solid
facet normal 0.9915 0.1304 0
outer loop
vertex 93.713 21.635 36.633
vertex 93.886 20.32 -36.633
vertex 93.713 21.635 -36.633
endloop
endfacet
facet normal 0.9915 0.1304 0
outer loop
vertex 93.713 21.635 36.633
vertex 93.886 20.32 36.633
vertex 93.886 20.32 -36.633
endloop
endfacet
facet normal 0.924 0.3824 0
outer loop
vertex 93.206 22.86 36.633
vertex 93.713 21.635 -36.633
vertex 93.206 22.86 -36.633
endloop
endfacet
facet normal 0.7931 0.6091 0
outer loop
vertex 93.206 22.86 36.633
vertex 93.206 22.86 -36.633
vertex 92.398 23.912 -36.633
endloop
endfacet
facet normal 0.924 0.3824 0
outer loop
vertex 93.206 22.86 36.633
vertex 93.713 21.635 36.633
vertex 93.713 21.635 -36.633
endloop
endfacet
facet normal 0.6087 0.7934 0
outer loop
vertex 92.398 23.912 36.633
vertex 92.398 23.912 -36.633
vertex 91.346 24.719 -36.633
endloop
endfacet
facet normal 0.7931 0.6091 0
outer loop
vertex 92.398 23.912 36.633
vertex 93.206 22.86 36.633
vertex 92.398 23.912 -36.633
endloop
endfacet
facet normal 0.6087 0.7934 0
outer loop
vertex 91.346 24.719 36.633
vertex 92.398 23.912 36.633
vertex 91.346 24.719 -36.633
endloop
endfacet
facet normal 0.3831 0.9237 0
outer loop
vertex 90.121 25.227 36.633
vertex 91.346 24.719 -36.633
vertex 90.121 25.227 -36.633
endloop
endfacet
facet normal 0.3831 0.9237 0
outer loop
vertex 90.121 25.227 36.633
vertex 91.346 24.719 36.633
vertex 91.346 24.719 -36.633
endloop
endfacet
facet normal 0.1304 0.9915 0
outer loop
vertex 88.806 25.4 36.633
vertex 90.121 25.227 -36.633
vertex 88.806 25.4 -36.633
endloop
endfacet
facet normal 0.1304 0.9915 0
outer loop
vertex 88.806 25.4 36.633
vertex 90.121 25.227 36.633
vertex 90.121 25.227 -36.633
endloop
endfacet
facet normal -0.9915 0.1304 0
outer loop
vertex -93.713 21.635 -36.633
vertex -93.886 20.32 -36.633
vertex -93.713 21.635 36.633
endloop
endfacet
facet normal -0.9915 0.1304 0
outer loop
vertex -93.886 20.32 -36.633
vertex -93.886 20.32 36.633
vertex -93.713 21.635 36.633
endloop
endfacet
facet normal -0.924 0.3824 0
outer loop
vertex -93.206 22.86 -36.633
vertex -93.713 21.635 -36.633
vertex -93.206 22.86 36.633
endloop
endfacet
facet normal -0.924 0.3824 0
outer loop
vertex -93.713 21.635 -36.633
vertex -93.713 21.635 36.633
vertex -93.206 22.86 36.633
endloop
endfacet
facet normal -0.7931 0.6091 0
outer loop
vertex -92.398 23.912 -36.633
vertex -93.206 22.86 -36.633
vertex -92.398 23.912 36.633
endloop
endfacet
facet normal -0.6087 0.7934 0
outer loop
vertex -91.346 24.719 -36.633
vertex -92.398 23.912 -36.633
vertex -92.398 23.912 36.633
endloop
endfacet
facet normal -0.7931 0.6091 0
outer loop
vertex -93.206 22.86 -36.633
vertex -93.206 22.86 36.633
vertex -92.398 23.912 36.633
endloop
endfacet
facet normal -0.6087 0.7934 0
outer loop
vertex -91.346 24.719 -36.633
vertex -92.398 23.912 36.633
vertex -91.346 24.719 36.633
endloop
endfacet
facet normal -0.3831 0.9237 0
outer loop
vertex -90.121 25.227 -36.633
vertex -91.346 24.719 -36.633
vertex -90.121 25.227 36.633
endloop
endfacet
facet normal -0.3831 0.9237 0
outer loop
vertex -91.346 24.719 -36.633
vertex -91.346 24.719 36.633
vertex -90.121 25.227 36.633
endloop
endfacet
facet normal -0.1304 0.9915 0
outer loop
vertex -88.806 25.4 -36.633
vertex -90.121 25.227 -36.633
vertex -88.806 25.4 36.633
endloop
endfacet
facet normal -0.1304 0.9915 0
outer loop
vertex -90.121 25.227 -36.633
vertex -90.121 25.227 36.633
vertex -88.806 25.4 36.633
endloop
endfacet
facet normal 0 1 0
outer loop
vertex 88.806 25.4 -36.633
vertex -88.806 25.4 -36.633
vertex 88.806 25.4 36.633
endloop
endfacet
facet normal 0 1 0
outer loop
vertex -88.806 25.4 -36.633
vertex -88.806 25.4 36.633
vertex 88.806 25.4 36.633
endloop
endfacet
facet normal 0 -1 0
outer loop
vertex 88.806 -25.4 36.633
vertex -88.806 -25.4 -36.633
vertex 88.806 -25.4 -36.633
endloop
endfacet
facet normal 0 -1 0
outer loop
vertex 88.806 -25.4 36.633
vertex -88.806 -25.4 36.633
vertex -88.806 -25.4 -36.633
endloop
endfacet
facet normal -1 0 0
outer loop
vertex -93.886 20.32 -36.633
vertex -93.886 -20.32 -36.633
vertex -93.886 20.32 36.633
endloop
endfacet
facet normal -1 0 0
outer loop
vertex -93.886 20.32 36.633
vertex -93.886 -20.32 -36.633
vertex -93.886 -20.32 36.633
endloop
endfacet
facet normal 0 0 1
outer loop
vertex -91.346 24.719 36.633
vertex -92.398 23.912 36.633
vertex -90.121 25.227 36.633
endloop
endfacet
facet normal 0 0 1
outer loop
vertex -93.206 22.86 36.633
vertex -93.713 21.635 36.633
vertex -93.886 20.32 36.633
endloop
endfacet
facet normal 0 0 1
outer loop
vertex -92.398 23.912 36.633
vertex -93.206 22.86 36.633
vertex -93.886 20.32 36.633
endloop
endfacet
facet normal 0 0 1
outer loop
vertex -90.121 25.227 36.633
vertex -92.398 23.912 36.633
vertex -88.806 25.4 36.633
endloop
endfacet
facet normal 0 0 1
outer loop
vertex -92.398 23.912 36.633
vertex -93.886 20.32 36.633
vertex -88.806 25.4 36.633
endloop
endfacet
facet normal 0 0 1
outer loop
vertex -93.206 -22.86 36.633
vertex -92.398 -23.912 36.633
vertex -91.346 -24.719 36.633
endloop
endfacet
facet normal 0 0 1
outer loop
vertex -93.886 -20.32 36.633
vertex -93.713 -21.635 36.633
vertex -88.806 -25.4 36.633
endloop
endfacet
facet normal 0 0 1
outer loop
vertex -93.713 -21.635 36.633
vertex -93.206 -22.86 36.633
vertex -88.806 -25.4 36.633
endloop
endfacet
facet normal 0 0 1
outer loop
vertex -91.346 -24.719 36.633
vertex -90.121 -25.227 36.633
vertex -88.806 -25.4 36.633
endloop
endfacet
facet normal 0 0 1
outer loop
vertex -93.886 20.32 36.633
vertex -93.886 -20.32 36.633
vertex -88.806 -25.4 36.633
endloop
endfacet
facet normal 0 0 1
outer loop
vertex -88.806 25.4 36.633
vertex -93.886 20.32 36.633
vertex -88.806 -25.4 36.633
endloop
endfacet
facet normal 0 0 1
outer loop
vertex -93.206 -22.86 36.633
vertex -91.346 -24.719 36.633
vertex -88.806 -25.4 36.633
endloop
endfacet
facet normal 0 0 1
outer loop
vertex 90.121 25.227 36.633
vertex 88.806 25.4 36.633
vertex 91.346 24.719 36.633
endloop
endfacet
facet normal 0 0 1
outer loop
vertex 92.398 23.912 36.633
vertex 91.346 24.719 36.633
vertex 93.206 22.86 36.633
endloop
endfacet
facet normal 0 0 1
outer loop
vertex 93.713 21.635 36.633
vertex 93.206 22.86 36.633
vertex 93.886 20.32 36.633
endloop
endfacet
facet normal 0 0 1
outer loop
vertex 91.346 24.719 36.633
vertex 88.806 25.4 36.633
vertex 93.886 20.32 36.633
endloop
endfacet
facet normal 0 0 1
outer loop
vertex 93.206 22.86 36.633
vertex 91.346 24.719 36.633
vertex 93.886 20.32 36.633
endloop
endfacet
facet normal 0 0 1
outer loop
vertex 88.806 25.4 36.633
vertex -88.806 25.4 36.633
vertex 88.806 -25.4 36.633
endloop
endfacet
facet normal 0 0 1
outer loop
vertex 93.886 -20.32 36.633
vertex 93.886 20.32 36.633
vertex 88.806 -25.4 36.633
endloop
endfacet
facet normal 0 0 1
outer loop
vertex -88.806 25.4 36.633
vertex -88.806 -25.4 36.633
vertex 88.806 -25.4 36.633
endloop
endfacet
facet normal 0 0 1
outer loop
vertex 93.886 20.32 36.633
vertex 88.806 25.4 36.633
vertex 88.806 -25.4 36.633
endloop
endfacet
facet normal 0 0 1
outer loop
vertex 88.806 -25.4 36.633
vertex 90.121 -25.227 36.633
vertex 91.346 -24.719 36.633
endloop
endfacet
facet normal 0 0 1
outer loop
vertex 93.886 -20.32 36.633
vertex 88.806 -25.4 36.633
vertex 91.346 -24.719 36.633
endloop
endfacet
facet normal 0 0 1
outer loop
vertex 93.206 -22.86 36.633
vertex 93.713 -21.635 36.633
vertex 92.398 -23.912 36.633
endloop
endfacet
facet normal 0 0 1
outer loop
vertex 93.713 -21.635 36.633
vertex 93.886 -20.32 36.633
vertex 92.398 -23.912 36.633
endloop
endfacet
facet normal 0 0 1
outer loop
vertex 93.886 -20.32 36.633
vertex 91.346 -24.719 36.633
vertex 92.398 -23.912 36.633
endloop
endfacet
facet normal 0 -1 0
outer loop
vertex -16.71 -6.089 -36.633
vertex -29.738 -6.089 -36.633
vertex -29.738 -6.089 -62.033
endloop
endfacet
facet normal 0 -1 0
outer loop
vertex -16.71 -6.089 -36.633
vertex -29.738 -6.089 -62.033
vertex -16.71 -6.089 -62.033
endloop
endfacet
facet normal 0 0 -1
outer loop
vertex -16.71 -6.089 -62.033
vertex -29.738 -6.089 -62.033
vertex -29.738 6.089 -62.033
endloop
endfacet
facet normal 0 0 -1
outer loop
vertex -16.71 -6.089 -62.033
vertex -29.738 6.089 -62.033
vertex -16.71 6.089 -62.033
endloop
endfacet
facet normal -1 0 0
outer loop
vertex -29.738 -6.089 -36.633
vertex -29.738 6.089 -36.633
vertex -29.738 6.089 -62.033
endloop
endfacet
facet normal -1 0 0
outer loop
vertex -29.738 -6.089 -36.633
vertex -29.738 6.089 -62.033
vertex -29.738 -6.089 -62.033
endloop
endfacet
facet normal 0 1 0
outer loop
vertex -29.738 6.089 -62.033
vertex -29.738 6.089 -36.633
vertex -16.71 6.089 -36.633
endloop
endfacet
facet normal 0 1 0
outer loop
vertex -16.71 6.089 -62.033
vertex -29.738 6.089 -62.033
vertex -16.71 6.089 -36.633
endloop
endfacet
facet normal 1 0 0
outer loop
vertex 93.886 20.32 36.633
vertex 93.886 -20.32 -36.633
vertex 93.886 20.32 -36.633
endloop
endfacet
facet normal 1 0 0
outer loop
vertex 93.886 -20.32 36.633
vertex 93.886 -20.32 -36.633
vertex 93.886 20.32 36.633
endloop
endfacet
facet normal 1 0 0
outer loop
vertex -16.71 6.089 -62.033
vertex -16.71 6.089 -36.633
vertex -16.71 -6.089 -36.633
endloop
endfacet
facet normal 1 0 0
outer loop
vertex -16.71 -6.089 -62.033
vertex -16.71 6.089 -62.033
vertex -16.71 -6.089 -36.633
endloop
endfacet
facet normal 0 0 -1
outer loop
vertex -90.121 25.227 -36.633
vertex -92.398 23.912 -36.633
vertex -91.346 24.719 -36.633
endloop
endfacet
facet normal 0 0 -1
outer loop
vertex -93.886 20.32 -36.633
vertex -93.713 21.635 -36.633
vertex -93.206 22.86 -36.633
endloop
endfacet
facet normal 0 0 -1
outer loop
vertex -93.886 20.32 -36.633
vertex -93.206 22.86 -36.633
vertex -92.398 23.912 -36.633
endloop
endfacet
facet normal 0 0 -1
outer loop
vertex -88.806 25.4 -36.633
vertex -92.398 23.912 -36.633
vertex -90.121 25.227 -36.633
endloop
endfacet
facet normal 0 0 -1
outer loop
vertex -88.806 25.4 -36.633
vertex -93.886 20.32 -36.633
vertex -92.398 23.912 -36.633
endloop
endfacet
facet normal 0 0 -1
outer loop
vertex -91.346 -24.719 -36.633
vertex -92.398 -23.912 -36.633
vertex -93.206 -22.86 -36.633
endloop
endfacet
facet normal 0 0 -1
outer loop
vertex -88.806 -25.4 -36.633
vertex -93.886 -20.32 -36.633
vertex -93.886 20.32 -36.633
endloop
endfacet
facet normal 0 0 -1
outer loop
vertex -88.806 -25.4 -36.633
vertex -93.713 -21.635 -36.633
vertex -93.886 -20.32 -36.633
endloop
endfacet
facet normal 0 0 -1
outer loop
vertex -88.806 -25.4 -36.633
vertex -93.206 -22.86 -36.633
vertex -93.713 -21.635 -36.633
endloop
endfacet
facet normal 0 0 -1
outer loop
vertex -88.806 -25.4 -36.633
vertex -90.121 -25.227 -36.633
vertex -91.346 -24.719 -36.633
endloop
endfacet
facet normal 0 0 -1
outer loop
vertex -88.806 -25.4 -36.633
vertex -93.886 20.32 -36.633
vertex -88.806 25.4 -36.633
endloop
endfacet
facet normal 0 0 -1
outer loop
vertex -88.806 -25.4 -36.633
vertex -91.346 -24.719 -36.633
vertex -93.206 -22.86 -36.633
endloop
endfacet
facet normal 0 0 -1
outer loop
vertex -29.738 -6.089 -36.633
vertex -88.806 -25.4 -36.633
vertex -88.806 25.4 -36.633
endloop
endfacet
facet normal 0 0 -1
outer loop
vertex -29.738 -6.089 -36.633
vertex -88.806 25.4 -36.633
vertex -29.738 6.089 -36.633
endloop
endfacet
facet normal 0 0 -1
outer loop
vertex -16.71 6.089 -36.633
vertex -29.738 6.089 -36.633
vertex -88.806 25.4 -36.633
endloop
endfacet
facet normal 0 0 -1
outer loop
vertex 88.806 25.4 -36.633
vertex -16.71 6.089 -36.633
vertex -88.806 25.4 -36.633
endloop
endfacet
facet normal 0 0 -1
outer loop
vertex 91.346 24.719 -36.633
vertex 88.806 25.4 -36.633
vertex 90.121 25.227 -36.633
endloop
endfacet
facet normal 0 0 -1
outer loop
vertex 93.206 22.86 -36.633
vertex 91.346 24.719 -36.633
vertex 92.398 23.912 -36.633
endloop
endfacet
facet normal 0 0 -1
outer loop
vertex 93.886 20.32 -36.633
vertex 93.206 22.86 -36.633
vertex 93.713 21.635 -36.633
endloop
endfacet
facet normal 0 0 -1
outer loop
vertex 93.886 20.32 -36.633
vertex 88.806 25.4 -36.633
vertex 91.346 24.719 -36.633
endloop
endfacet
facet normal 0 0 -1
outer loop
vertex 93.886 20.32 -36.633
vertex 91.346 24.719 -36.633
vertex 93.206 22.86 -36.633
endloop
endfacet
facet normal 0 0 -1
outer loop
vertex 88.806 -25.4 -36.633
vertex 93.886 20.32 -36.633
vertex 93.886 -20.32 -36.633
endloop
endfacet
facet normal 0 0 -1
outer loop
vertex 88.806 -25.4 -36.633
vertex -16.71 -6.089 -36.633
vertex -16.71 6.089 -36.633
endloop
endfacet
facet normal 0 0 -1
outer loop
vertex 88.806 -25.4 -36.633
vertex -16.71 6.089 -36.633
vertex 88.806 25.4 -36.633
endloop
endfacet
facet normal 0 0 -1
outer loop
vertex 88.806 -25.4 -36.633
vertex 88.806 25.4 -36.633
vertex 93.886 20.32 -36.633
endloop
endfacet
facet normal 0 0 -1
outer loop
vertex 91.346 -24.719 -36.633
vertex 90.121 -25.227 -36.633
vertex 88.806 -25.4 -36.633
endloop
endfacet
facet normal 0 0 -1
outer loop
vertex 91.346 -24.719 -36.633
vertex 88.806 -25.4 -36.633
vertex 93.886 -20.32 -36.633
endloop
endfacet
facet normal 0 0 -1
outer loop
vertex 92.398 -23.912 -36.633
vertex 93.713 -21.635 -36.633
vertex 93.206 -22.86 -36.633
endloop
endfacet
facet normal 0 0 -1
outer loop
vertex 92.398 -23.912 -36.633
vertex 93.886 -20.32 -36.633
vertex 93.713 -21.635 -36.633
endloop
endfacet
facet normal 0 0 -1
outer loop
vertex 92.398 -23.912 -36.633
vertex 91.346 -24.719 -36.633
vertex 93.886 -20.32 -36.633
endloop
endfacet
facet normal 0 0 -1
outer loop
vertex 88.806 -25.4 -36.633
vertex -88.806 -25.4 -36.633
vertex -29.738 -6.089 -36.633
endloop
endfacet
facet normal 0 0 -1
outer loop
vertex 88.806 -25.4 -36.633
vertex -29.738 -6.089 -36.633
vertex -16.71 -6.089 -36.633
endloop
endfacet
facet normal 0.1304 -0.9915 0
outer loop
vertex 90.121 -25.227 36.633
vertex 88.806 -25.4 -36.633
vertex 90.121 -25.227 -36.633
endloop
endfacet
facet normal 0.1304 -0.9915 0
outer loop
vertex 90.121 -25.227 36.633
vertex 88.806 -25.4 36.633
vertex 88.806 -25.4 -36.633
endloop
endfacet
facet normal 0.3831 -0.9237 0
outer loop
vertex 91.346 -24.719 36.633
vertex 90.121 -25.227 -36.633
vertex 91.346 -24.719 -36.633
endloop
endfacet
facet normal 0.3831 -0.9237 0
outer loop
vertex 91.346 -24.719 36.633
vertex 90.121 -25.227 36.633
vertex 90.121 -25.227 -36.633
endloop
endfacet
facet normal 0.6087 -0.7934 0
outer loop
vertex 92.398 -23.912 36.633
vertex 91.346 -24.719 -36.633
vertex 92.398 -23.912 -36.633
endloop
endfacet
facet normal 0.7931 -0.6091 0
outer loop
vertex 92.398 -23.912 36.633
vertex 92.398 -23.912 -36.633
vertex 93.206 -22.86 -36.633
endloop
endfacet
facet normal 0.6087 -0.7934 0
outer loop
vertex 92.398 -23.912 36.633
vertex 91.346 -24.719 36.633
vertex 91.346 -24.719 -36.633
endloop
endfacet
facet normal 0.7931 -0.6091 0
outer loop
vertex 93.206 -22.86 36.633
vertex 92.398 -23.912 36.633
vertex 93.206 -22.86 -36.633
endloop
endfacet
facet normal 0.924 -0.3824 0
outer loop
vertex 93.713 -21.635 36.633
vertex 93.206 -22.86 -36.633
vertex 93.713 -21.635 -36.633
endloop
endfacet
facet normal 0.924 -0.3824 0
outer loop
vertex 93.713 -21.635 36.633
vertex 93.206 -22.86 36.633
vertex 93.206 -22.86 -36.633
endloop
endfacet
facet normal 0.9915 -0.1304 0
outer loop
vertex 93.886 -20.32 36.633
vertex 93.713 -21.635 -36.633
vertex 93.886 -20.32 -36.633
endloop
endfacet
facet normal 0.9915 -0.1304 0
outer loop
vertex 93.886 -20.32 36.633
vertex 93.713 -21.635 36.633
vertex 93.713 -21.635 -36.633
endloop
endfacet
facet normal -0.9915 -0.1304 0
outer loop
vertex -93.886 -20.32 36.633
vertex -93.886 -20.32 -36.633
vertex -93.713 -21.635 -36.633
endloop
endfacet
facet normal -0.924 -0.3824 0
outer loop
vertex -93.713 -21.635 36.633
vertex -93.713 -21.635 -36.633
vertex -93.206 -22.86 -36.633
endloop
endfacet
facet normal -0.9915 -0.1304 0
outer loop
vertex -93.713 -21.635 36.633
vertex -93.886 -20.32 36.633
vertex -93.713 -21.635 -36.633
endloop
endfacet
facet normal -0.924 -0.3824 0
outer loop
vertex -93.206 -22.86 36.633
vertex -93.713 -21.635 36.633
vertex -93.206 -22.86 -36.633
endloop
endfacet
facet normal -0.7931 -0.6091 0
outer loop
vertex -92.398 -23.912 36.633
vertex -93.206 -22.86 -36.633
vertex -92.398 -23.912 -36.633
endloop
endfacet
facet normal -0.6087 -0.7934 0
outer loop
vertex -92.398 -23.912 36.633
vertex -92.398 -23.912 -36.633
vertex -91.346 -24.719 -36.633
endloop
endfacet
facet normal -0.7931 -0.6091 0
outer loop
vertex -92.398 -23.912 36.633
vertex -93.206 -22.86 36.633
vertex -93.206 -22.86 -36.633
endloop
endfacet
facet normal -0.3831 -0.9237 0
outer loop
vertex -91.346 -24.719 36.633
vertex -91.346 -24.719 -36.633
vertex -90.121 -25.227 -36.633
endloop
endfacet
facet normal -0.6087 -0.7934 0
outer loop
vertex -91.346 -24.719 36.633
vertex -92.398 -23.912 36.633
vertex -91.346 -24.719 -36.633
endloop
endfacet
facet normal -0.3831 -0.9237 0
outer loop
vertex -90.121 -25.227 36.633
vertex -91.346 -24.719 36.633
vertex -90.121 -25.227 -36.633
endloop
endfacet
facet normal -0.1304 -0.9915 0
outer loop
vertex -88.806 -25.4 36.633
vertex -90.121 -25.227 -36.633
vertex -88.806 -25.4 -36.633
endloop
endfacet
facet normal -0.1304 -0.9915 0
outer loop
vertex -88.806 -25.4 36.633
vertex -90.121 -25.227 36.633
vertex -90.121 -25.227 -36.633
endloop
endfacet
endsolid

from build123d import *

# Parameters (mm, degrees)
F0_W     = 187.772378
F0_H     = 73.266328
F1_DEPTH = 25.4
F2_R     = 5.08
F3_W     = 13.028179
F3_H     = 12.178514
F4_DEPTH = 25.4


with BuildPart() as f1:
    # F0 (on Front) → F1 (new body, symmetric)
    with BuildSketch(Plane.XZ):
        Rectangle(F0_W, F0_H)
    extrude(amount=F1_DEPTH, both=True)

    # F2
    f2_edges = [f1.edges().sort_by_distance(p)[0] for p in [
        (93.886189, -25.4, 0),
        (93.886189, 25.4, 0),
        (-93.886189, -25.4, 0),
        (-93.886189, 25.4, 0),
    ]]
    fillet(f2_edges, radius=F2_R)

    # F3 (on face) → F4 (join)
    with BuildSketch(Plane(origin=(0, 0, -36.633164), x_dir=(1, 0, 0), z_dir=(0, 0, -1))):
        with Locations((-23.224139, 0)):
            Rectangle(F3_W, F3_H)
    extrude(amount=F4_DEPTH)


solid = f1.part
